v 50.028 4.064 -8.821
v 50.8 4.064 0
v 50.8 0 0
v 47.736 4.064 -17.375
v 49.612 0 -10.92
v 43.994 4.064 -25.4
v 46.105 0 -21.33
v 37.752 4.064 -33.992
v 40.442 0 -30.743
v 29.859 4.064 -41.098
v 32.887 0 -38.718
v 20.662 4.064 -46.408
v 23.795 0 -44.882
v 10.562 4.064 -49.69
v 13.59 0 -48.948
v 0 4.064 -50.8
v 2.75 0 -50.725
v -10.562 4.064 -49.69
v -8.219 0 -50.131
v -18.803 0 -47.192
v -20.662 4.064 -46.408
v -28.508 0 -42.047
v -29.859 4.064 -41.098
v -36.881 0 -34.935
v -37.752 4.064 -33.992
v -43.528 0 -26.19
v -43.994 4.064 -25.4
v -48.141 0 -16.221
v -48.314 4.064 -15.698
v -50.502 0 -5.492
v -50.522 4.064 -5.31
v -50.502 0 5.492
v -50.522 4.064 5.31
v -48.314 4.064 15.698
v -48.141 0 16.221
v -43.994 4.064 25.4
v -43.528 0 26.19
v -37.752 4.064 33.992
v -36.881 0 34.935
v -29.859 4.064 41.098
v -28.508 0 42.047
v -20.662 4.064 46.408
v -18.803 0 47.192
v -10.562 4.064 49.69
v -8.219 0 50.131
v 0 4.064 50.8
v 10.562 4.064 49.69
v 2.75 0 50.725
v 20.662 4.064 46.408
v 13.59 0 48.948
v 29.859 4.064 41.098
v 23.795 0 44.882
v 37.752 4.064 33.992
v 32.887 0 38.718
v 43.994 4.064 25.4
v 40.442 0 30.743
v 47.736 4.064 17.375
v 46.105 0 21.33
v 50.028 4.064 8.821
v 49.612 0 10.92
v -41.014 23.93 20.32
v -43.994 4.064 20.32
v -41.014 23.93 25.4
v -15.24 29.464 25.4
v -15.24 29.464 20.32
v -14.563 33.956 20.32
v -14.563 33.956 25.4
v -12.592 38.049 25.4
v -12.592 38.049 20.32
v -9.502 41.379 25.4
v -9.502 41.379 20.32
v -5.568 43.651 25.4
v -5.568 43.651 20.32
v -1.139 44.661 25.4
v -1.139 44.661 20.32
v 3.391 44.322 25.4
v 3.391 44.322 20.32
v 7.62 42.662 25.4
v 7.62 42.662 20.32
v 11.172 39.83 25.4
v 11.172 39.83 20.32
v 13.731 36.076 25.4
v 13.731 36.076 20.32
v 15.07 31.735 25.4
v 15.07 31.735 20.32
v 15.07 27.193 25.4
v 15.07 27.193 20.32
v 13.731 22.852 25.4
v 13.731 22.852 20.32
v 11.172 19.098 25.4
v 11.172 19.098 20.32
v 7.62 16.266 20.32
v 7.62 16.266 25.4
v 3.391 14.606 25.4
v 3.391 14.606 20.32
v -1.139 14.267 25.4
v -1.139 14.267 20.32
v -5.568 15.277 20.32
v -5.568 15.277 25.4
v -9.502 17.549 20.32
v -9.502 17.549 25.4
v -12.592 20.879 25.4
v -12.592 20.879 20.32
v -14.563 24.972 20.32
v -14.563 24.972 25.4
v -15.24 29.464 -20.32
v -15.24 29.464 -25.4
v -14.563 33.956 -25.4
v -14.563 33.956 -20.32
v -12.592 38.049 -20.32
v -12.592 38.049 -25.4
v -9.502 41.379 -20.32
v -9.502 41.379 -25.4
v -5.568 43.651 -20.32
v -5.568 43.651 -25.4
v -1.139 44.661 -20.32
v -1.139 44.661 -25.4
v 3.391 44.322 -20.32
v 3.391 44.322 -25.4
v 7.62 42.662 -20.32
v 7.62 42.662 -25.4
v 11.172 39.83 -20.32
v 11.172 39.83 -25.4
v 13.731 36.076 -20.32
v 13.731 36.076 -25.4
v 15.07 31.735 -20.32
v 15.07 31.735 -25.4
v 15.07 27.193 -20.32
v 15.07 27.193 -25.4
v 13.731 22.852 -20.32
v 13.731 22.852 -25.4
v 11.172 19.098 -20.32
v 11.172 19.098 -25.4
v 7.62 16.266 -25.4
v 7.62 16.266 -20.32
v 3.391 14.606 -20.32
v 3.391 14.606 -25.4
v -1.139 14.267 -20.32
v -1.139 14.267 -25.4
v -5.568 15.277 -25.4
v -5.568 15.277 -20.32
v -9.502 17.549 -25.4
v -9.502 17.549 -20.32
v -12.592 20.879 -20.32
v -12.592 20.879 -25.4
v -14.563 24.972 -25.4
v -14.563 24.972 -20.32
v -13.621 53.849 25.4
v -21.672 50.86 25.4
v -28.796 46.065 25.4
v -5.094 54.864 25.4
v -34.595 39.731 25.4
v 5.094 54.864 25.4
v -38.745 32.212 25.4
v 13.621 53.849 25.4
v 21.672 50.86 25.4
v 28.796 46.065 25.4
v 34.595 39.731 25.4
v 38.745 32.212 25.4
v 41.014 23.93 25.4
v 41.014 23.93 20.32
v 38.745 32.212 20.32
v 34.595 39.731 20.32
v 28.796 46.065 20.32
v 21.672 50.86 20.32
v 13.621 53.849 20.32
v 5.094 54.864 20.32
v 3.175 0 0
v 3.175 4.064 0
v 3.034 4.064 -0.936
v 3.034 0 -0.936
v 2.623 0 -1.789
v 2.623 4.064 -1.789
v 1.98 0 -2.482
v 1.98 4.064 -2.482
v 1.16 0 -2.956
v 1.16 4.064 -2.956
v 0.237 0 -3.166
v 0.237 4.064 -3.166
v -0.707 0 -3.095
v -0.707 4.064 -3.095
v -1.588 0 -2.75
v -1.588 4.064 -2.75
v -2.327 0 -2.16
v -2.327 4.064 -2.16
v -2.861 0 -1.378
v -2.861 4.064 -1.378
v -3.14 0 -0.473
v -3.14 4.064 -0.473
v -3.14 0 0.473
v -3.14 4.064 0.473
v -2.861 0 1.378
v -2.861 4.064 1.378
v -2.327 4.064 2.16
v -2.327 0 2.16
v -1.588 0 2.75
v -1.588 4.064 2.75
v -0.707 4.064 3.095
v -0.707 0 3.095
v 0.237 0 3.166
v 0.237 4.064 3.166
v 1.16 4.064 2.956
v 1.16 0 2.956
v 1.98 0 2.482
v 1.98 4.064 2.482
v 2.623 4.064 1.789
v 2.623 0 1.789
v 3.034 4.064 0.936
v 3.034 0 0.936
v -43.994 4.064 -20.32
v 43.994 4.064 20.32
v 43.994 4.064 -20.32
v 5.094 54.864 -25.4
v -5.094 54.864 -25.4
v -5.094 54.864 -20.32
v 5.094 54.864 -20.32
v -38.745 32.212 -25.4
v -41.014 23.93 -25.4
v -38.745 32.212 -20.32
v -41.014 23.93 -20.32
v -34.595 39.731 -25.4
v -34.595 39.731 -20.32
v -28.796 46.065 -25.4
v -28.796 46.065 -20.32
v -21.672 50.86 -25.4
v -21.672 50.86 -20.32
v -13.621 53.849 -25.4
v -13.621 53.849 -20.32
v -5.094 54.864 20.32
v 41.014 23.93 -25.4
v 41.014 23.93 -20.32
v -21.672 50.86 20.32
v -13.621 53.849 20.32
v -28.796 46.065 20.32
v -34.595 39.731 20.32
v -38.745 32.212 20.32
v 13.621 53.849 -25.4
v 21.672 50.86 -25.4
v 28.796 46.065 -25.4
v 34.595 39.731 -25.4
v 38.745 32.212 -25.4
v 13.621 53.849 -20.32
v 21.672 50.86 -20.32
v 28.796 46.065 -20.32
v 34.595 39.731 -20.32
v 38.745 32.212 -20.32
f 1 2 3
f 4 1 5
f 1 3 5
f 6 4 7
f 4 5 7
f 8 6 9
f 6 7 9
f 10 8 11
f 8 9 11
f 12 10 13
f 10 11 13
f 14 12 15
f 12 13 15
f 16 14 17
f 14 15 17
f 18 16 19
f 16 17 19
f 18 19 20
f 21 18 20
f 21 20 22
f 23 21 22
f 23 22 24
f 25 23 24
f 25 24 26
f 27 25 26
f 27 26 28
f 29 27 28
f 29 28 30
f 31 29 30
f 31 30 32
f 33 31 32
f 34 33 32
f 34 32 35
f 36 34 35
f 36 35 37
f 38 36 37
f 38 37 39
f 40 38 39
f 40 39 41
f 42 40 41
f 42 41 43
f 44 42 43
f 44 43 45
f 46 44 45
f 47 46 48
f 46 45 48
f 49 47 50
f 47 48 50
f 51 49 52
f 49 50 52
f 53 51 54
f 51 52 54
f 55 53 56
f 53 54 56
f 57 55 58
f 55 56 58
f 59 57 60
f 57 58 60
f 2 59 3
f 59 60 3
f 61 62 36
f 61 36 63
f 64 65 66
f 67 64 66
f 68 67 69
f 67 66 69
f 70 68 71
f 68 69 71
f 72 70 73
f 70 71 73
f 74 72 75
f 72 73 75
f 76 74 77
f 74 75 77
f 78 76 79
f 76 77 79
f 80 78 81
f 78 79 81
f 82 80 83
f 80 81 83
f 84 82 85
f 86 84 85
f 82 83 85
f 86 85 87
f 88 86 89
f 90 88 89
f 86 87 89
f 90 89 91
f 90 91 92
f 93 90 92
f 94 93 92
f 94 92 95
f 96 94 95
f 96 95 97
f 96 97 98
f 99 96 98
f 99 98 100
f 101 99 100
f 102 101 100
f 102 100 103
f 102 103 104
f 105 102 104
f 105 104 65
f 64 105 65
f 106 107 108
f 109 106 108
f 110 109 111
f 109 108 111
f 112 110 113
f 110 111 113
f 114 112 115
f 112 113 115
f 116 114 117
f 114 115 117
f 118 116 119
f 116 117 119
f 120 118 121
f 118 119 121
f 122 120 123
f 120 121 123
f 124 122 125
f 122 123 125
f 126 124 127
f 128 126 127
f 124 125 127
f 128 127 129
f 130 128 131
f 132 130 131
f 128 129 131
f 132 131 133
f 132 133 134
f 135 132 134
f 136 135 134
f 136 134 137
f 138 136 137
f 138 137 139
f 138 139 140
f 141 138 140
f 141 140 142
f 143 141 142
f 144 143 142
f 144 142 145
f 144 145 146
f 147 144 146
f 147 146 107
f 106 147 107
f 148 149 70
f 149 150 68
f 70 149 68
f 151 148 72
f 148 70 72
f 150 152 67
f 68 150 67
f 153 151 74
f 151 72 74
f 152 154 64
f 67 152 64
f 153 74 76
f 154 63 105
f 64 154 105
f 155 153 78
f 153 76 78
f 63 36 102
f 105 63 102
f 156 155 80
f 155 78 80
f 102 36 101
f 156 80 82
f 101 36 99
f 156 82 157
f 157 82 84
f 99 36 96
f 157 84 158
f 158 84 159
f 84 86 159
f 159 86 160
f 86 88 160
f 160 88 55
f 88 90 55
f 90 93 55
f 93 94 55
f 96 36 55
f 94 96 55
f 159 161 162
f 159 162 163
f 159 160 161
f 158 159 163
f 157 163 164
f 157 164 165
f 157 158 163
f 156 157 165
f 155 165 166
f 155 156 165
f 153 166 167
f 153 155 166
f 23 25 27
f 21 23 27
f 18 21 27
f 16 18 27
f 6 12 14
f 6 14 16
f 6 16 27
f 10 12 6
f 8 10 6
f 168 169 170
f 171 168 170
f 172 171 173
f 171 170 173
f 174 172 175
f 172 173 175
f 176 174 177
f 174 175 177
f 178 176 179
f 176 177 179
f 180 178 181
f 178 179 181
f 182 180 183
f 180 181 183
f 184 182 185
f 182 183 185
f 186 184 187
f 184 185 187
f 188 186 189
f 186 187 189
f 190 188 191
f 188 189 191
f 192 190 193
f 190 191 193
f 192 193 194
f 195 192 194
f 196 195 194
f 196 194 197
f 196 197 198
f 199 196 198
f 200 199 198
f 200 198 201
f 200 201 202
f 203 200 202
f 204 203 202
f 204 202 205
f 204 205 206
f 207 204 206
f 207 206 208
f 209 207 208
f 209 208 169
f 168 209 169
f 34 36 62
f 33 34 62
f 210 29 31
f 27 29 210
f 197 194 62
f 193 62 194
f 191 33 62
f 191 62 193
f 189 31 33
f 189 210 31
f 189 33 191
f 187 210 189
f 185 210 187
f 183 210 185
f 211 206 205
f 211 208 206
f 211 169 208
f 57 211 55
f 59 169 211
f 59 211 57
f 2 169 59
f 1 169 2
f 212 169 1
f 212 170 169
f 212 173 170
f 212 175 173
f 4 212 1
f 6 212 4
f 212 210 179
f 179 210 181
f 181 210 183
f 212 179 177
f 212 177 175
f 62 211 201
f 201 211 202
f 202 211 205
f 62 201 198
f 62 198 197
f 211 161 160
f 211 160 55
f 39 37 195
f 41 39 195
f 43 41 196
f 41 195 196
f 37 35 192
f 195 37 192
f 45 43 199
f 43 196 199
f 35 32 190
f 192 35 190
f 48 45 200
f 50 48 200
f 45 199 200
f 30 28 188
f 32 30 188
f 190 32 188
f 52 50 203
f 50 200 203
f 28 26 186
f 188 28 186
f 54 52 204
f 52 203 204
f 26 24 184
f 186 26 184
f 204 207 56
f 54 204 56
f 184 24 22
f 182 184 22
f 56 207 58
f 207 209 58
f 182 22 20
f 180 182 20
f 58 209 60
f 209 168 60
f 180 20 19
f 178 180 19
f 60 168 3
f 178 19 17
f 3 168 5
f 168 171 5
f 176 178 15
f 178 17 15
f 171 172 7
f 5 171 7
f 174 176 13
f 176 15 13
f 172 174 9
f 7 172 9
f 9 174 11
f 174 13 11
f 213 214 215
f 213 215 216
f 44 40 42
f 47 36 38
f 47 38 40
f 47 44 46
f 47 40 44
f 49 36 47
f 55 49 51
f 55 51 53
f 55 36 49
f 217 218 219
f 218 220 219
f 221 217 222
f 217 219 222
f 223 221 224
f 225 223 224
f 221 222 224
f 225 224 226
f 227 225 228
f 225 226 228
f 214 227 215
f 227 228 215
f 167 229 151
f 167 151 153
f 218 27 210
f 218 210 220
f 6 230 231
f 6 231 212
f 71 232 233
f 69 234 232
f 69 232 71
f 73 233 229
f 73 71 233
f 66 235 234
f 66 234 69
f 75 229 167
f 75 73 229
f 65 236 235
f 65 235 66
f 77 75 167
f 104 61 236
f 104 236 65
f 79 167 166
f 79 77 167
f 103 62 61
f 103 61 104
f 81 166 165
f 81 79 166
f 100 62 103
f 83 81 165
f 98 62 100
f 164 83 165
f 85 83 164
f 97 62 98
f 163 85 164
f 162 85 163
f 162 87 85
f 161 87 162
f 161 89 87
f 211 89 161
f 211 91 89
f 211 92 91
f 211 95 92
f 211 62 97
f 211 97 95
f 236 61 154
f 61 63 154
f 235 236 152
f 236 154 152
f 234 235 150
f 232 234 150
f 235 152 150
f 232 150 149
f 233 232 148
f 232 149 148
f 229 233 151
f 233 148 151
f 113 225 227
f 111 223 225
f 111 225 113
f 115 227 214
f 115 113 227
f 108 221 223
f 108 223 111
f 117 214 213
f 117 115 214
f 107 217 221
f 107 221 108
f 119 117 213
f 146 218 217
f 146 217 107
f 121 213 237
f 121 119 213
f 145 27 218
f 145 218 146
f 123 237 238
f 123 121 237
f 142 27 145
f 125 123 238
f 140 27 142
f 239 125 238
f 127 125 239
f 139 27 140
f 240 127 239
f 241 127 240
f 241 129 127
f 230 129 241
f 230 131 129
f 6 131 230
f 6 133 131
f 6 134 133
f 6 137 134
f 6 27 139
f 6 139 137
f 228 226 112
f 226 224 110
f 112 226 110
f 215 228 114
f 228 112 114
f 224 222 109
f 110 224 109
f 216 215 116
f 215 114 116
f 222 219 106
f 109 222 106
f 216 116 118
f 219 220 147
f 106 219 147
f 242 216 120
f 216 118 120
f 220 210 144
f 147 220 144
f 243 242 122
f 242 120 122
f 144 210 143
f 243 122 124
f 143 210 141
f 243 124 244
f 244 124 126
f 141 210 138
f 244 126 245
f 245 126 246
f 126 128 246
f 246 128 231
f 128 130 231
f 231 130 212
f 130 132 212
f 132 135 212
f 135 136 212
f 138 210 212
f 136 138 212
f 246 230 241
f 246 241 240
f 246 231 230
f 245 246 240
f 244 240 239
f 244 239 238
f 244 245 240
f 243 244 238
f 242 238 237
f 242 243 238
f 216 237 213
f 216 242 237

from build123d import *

# Parameters (mm, degrees)
SKETCH2_R           = 50.8
BOSS_EXTRUDE1_DEPTH = 4.064
SKETCH3_W           = 87.988181024
SKETCH3_H           = 5.08
BOSS_EXTRUDE2_DEPTH = 50.8
CUT_EXTRUDE2_DEPTH  = 77.2
FILLET1_R           = 36.322
SKETCH6_R           = 15.24
CUT_EXTRUDE3_DEPTH  = 77.2
SKETCH7_R           = 3.175
CUT_EXTRUDE4_DEPTH  = 5.064


with BuildPart() as part:
    # Sketch2 → Boss-Extrude1 (new body)
    with BuildSketch(Plane(origin=(0, 0, 0), x_dir=(1, 0, 0), z_dir=(0, 1, 0))):
        Circle(SKETCH2_R)
    extrude(amount=BOSS_EXTRUDE1_DEPTH)

    # Sketch3 → Boss-Extrude2 (add)
    with BuildSketch(Plane(origin=(0, 4.064, 0), x_dir=(1, 0, 0), z_dir=(0, 1, 0))):
        with Locations((0, -22.86)):
            Rectangle(SKETCH3_W, SKETCH3_H)
        with Locations((0, 22.86)):
            Rectangle(SKETCH3_W, SKETCH3_H)
    extrude(amount=BOSS_EXTRUDE2_DEPTH)

    # Sketch5 → Cut-Extrude2 (cut, through all)
    with BuildSketch(Plane(origin=(0, 0, -25.4), x_dir=(-1, 0, 0), z_dir=(0, 0, -1))):
        Polygon((-43.994090512, 4.064), (-43.994090512, 54.864), (-36.374090512, 54.864), align=None)
        Polygon((43.994090512, 4.064), (36.374090512, 54.864), (43.994090512, 54.864), align=None)
    extrude(amount=-CUT_EXTRUDE2_DEPTH, mode=Mode.SUBTRACT)

    # Fillet1
    fillet1_edges = [part.edges().sort_by_distance(p)[0] for p in [
        (36.374090512, 54.864, -22.86),
        (36.374090512, 54.864, 22.86),
        (-36.374090512, 54.864, -22.86),
        (-36.374090512, 54.864, 22.86),
    ]]
    fillet(fillet1_edges, radius=FILLET1_R)

    # Sketch6 → Cut-Extrude3 (cut, through all)
    with BuildSketch(Plane(origin=(0, 0, -25.4), x_dir=(-1, 0, 0), z_dir=(0, 0, -1))):
        with Locations((0, 29.464)):
            Circle(SKETCH6_R)
    extrude(amount=-CUT_EXTRUDE3_DEPTH, mode=Mode.SUBTRACT)

    # Sketch7 → Cut-Extrude4 (cut, through all)
    with BuildSketch(Plane(origin=(0, 4.064, 0), x_dir=(1, 0, 0), z_dir=(0, 1, 0))):
        Circle(SKETCH7_R)
    extrude(amount=-CUT_EXTRUDE4_DEPTH, mode=Mode.SUBTRACT)


solid = part.part
